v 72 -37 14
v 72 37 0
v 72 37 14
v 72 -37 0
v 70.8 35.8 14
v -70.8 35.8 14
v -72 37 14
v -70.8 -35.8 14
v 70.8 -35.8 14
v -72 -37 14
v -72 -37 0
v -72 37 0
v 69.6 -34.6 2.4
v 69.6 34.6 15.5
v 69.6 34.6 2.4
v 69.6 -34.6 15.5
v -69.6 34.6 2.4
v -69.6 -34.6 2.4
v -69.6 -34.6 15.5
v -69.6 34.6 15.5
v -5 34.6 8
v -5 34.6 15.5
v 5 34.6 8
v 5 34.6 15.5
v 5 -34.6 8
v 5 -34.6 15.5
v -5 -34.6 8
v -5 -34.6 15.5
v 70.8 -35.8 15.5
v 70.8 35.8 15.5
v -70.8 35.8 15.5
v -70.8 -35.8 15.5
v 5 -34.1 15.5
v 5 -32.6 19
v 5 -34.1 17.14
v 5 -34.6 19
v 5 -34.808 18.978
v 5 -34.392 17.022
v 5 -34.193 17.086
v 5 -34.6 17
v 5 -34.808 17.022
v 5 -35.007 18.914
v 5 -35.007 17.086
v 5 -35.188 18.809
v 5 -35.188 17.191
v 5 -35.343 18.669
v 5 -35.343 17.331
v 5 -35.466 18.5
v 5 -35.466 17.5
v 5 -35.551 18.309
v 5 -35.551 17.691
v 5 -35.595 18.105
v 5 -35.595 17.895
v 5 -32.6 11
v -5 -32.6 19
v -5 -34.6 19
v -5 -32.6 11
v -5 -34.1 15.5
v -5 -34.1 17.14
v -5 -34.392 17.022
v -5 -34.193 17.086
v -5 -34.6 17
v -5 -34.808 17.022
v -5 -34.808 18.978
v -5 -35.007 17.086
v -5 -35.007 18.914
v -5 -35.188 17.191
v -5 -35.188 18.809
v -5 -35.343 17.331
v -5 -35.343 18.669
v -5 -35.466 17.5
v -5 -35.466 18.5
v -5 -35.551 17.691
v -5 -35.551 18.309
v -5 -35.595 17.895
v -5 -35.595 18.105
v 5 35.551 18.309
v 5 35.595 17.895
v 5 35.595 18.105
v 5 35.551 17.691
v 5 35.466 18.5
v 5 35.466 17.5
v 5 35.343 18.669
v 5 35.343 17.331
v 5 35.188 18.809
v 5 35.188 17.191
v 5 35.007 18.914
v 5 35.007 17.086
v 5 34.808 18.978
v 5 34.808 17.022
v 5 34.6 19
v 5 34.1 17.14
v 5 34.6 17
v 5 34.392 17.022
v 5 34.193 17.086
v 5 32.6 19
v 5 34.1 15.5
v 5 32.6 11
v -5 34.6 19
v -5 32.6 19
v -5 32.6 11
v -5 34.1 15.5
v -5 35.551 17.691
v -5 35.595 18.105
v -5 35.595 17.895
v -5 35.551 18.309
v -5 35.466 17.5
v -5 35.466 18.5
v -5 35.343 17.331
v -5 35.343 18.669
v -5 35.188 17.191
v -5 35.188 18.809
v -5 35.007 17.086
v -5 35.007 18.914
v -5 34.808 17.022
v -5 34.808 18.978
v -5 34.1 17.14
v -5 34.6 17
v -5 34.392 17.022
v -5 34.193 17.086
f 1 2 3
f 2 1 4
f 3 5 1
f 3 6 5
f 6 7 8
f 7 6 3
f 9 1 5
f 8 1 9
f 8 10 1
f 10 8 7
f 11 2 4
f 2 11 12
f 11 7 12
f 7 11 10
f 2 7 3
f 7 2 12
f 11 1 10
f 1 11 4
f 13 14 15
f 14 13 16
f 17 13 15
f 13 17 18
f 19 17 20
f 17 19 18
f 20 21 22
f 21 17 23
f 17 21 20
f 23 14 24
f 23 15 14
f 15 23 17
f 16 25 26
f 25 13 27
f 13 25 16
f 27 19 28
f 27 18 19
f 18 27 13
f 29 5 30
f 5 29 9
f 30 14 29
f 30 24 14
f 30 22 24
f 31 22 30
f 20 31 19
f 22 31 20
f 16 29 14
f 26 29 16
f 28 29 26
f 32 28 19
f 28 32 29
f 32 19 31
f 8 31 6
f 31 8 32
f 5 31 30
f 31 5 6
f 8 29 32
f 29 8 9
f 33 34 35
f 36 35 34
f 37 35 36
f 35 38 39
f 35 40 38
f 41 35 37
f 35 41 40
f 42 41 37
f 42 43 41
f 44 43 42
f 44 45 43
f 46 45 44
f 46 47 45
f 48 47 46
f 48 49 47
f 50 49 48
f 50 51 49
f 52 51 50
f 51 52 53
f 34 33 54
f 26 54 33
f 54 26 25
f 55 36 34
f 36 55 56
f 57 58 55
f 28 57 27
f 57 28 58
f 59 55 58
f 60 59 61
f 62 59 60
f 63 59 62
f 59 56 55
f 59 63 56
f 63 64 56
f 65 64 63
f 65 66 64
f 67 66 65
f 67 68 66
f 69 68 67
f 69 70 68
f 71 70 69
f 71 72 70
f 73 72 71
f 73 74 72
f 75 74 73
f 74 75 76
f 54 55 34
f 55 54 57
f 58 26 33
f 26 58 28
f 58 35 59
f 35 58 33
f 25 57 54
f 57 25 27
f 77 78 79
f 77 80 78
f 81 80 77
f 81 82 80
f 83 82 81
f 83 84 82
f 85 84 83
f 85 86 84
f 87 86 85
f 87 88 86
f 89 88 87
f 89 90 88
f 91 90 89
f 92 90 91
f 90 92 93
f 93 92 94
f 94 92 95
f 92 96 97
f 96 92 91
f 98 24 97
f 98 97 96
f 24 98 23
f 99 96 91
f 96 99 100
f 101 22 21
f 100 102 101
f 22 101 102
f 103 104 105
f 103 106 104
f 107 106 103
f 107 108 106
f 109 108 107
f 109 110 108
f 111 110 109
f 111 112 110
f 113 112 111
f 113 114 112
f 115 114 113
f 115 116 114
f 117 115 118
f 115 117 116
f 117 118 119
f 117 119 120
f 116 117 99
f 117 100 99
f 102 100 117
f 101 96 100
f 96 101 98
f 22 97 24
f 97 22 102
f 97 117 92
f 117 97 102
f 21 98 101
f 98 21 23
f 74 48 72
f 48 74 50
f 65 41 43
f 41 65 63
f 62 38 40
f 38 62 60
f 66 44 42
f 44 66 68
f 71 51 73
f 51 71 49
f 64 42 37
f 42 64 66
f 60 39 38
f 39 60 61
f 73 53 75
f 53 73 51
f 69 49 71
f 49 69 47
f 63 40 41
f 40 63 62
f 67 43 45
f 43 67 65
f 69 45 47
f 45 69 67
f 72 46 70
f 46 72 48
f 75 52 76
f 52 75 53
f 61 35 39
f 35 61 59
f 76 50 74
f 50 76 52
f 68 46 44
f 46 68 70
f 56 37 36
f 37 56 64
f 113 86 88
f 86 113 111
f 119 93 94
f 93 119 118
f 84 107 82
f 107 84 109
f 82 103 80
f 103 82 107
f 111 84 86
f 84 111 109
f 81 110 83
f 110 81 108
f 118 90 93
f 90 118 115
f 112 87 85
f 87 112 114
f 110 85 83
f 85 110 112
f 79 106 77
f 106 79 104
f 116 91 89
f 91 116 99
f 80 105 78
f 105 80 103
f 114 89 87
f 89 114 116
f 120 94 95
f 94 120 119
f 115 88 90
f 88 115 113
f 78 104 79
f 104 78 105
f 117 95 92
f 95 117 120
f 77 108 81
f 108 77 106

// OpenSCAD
/* [Global] */

// Box Length
TotalX = 144;
// Box Width
TotalY = 74;
// Box Height
TotalZ = 21;  // (Including Lid)

// What to Model
Render = "Box";   // "Both", "Box", "Lid"

// Wall Thickness
gWT = 2.4;

// Type of lid pattern
gPattern = "Fish"; //  [Hex, Web, Solid, Diamond, Fancy]

/* [Spider Web] */

// Amount of space from one ring or webs to the next
WebSpacing = 10;
// How many rings of webs, best of more than needed
WebStrands = 5;
// Thickness of the strands
WedThickness = 1.8;
// How many segments of web
WebWedges = 12;

/* [Hidden] */
gLidHeight = 7;   // Total height is gLigHeight + gBoxHeigth

//  The height of the box without the lid
AdjBoxHeight = TotalZ - gLidHeight;

$fn=30;

 module regular_polygon(order, r=1)
 {
        angles=[ for (i = [0:order-1]) i*(360/order) ];
        coords=[ for (th=angles) [r*cos(th), r*sin(th)] ];
        polygon(coords);
 }

module circle_lattice(ipX, ipY, Spacing=10, Walls=1.2)  {


   intersection() {
      square([ipX,ipY]); 
      union() {
        for (x=[-Spacing:Spacing:ipX+Spacing]) {
          for (y=[-Spacing:Spacing:ipY+Spacing]){
             difference()  {
                   translate([x+Spacing/2, y+Spacing/2]) circle(r=Spacing*0.75);
                   translate([x+Spacing/2, y+Spacing/2]) circle(r=(Spacing*0.75)-Walls);
                }
            }   // end for y        
        }  // end for x
       } // Union
   }
}


module hex_lattice(ipX, ipY, DSize, WSize)  {
    lXOffset = DSize + WSize;
    lYOffset = (DSize+WSize)/cos(30) * 1.5;

	difference()  {
		square([ipX, ipY]);
		for (x=[0:lXOffset:ipX]) {
            for (y=[0:lYOffset:ipY]){
  			   translate([x, y]) rotate([0,0,30]) regular_polygon(6, r=DSize/cos(30)/2);
			   translate([x+lXOffset/2, y+lYOffset/2]) rotate([0,0,30]) regular_polygon(6, r=DSize/cos(30)/2);
		    }
        }  
	}
}

module diamond_lattice(ipX, ipY, DSize, WSize)  {

    lOffset = DSize + WSize;

	difference()  {
		square([ipX, ipY]);
		for (x=[0:lOffset:ipX]) {
            for (y=[0:lOffset:ipY]){
  			   translate([x, y])  regular_polygon(4, r=DSize/2);
			   translate([x+lOffset/2, y+lOffset/2]) regular_polygon(4, r=DSize/2);
		    }
        }        
	}
}

module half_circle(ipRadius,width){
    difference(){
        circle(ipRadius, center = true);
        circle(ipRadius-width, center = true);
        translate([-ipRadius*2,0])square(ipRadius*4, center = true);
    }
}
   

module scale_lattice(ipX, ipY, DSize, WSize)  {

    lOffset = DSize-(WSize/2);

    intersection()  
    {
	  square([ipX, ipY]);
      union() {
        for (x=[0:lOffset:ipX]) {
          for (y=[0:lOffset:ipY+lOffset]){
             translate([x, y]) half_circle (DSize/2,WSize) ;
             translate([x+lOffset/2, y+lOffset/2]) half_circle (DSize/2,WSize) ;
          }
        }  
      }
   }      
}


// Make a star with X points
module star(radius, wedges)
{
	angle = 360 / wedges;
	difference() {
		circle(radius, $fn = wedges);
		for(i = [0:wedges - 1]) {
			rotate(angle / 2 + angle * i) translate([radius, 0, 0]) 
			    scale([0.8, 1, 1]) 
				    circle(radius * sin(angle / 2), $fn = 24);
		}
	}
}

module spider_web(ipWebSpacing, strands, ipThickness, wedges) 
{
	for(i = [0:strands - 1]) 
    {
        difference() {
            star(ipWebSpacing * i, wedges);
            offset(r = -ipThickness) star(ipWebSpacing * i, wedges);
        }
	}

	angle = 360 / wedges;
	for(i = [0:wedges - 1])
    {
		rotate(angle * i) translate([0, -ipThickness / 2, 0]) 
			square([ipWebSpacing * strands, ipThickness]);
	}    
}



// The Lid
module Lid() {
    difference() 
    {
        translate ([0,0,gLidHeight/2]) cube([TotalX, TotalY, gLidHeight], center = true);
        // remove the main part
        cube([TotalX-2*gWT, TotalY-2*gWT, gLidHeight*3],center=true);
        //Create the lip 1.5 mm lip deep and 1 mm wide
        translate([0, 0, gLidHeight+1-1.5]) cube ([TotalX-1.8, TotalY-1.8, 2], center = true);
        
        //Create the indent for the latch
        hull() 
        {
            translate ([-5.5,TotalY/2-gWT,3]) rotate([0, 90, 0])  {cylinder(h=11, r1 = 1.1, r2 = 1.1, $fn=30);}
            translate ([-5.5,TotalY/2-gWT,3.2]) rotate([0, 90, 0])  {cylinder(h=11, r1 = 1.1, r2 = 1.1, $fn=30);}
        }
        hull() 
        {
            translate ([-5.5,-TotalY/2+gWT,3]) rotate([0, 90, 0])  {cylinder(h=11, r1 = 1.1, r2 = 1.1, $fn=30);}
            translate ([-5.5,-TotalY/2+gWT,3.2]) rotate([0, 90, 0])  {cylinder(h=11, r1 = 1.1, r2 = 1.1, $fn=30);}
       }
    }

    // Spiderweb top
    if (gPattern == "Web")
    {
        intersection () 
        {    
            translate ([TotalX/2, TotalY/2,0]) linear_extrude(height = 1.5) 
            spider_web(WebSpacing, WebStrands, WedThickness, WebWedges);  
            
            cube([TotalX, TotalY, gLidHeight*2]); 
        }
    }

    // Hex top
    if (gPattern == "Hex")
    {
     translate([-TotalX/2,-TotalY/2,0]) linear_extrude(height = 1.5) {hex_lattice(TotalX,TotalY,6,2);}
    }

    // Diamond top
    if (gPattern == "Diamond")
    {
     translate([-TotalX/2,-TotalY/2,0]) linear_extrude(height = 1.5) {diamond_lattice(TotalX,TotalY,7,2);}
    }

    // Solid top
    if (gPattern == "Solid")
    {
     translate([0,0,1.5/2]) cube ([TotalX, TotalY, 1.5],center=true);
    }

    // fancy top
    if (gPattern == "Fish") 
    {
     translate([-TotalX/2,-TotalY/2,0]) linear_extrude(height = 1.5) {scale_lattice(TotalX,TotalY,9,1.5);}
    }
    
    // fancy top
    if (gPattern == "Fancy") 
    {
      translate([-TotalX/2,-TotalY/2,0]) linear_extrude(height = 1.5) circle_lattice(TotalX,TotalY);
    }
}

//  Main Box
module Box() {

    // create shell
    difference() {    
       translate([0,0,AdjBoxHeight/2]) cube([TotalX,TotalY,AdjBoxHeight],center=true);
       translate([0,0,AdjBoxHeight/2+gWT]) cube([TotalX-2*gWT,TotalY-2*gWT,AdjBoxHeight],center=true);
    } 

    // lip of box
    difference () {
        translate([0,0, AdjBoxHeight+1.5/2]) cube([TotalX-gWT,TotalY-gWT,1.5],center=true);
        translate([0,0, AdjBoxHeight+2/2]) cube([TotalX-gWT*2,TotalY-gWT*2,2],center=true);
    }

    //tab 1
    difference() 
    {
        translate([0, -TotalY/2+gWT+2/2, AdjBoxHeight + 11/2 - 6])  cube([10, 2, 11],center=true); 
        //slot for edge of lid
        translate([0, -TotalY/2+gWT+0.5/2, AdjBoxHeight + 2/2 + 1.5]) cube([10, 0.5, 2],center=true);
        translate ([-6, -TotalY/2+gWT, AdjBoxHeight - 6])rotate ([0,90,0]) linear_extrude(12) polygon([[0,0],[0,2],[-3,2]]);
    }
    translate ([-5,-TotalY/2+gWT,AdjBoxHeight+4]) rotate([0, 90, 0])  {cylinder(h=10, r1 = 1, r2 = 1,, $fn=30);}

    //tab 2
    difference() 
    {
        translate([0, TotalY/2-gWT-2/2, AdjBoxHeight+ 11/2 - 6]) cube([10, 2, 11],center=true); 
        translate([0, TotalY/2-gWT-0.5/2, AdjBoxHeight+2/2+1.5]) cube([10, 0.5, 2],center=true);
        translate ([-6, TotalY/2-gWT-2, AdjBoxHeight - 6])rotate ([0,90,0]) linear_extrude(12) polygon([[0,0],[-3,0],[0,2]]);
    }
    translate ([-5,TotalY/2-gWT,AdjBoxHeight+4]) rotate([0, 90, 0])  {cylinder(h=10, r1 = 1, r2 = 1, $fn=30);}
}




if((Render=="Both") || (Render == "Box")) {Box();}

if((Render=="Both") || (Render == "Lid")) {translate ([0,TotalY+10,0])  Lid();}
